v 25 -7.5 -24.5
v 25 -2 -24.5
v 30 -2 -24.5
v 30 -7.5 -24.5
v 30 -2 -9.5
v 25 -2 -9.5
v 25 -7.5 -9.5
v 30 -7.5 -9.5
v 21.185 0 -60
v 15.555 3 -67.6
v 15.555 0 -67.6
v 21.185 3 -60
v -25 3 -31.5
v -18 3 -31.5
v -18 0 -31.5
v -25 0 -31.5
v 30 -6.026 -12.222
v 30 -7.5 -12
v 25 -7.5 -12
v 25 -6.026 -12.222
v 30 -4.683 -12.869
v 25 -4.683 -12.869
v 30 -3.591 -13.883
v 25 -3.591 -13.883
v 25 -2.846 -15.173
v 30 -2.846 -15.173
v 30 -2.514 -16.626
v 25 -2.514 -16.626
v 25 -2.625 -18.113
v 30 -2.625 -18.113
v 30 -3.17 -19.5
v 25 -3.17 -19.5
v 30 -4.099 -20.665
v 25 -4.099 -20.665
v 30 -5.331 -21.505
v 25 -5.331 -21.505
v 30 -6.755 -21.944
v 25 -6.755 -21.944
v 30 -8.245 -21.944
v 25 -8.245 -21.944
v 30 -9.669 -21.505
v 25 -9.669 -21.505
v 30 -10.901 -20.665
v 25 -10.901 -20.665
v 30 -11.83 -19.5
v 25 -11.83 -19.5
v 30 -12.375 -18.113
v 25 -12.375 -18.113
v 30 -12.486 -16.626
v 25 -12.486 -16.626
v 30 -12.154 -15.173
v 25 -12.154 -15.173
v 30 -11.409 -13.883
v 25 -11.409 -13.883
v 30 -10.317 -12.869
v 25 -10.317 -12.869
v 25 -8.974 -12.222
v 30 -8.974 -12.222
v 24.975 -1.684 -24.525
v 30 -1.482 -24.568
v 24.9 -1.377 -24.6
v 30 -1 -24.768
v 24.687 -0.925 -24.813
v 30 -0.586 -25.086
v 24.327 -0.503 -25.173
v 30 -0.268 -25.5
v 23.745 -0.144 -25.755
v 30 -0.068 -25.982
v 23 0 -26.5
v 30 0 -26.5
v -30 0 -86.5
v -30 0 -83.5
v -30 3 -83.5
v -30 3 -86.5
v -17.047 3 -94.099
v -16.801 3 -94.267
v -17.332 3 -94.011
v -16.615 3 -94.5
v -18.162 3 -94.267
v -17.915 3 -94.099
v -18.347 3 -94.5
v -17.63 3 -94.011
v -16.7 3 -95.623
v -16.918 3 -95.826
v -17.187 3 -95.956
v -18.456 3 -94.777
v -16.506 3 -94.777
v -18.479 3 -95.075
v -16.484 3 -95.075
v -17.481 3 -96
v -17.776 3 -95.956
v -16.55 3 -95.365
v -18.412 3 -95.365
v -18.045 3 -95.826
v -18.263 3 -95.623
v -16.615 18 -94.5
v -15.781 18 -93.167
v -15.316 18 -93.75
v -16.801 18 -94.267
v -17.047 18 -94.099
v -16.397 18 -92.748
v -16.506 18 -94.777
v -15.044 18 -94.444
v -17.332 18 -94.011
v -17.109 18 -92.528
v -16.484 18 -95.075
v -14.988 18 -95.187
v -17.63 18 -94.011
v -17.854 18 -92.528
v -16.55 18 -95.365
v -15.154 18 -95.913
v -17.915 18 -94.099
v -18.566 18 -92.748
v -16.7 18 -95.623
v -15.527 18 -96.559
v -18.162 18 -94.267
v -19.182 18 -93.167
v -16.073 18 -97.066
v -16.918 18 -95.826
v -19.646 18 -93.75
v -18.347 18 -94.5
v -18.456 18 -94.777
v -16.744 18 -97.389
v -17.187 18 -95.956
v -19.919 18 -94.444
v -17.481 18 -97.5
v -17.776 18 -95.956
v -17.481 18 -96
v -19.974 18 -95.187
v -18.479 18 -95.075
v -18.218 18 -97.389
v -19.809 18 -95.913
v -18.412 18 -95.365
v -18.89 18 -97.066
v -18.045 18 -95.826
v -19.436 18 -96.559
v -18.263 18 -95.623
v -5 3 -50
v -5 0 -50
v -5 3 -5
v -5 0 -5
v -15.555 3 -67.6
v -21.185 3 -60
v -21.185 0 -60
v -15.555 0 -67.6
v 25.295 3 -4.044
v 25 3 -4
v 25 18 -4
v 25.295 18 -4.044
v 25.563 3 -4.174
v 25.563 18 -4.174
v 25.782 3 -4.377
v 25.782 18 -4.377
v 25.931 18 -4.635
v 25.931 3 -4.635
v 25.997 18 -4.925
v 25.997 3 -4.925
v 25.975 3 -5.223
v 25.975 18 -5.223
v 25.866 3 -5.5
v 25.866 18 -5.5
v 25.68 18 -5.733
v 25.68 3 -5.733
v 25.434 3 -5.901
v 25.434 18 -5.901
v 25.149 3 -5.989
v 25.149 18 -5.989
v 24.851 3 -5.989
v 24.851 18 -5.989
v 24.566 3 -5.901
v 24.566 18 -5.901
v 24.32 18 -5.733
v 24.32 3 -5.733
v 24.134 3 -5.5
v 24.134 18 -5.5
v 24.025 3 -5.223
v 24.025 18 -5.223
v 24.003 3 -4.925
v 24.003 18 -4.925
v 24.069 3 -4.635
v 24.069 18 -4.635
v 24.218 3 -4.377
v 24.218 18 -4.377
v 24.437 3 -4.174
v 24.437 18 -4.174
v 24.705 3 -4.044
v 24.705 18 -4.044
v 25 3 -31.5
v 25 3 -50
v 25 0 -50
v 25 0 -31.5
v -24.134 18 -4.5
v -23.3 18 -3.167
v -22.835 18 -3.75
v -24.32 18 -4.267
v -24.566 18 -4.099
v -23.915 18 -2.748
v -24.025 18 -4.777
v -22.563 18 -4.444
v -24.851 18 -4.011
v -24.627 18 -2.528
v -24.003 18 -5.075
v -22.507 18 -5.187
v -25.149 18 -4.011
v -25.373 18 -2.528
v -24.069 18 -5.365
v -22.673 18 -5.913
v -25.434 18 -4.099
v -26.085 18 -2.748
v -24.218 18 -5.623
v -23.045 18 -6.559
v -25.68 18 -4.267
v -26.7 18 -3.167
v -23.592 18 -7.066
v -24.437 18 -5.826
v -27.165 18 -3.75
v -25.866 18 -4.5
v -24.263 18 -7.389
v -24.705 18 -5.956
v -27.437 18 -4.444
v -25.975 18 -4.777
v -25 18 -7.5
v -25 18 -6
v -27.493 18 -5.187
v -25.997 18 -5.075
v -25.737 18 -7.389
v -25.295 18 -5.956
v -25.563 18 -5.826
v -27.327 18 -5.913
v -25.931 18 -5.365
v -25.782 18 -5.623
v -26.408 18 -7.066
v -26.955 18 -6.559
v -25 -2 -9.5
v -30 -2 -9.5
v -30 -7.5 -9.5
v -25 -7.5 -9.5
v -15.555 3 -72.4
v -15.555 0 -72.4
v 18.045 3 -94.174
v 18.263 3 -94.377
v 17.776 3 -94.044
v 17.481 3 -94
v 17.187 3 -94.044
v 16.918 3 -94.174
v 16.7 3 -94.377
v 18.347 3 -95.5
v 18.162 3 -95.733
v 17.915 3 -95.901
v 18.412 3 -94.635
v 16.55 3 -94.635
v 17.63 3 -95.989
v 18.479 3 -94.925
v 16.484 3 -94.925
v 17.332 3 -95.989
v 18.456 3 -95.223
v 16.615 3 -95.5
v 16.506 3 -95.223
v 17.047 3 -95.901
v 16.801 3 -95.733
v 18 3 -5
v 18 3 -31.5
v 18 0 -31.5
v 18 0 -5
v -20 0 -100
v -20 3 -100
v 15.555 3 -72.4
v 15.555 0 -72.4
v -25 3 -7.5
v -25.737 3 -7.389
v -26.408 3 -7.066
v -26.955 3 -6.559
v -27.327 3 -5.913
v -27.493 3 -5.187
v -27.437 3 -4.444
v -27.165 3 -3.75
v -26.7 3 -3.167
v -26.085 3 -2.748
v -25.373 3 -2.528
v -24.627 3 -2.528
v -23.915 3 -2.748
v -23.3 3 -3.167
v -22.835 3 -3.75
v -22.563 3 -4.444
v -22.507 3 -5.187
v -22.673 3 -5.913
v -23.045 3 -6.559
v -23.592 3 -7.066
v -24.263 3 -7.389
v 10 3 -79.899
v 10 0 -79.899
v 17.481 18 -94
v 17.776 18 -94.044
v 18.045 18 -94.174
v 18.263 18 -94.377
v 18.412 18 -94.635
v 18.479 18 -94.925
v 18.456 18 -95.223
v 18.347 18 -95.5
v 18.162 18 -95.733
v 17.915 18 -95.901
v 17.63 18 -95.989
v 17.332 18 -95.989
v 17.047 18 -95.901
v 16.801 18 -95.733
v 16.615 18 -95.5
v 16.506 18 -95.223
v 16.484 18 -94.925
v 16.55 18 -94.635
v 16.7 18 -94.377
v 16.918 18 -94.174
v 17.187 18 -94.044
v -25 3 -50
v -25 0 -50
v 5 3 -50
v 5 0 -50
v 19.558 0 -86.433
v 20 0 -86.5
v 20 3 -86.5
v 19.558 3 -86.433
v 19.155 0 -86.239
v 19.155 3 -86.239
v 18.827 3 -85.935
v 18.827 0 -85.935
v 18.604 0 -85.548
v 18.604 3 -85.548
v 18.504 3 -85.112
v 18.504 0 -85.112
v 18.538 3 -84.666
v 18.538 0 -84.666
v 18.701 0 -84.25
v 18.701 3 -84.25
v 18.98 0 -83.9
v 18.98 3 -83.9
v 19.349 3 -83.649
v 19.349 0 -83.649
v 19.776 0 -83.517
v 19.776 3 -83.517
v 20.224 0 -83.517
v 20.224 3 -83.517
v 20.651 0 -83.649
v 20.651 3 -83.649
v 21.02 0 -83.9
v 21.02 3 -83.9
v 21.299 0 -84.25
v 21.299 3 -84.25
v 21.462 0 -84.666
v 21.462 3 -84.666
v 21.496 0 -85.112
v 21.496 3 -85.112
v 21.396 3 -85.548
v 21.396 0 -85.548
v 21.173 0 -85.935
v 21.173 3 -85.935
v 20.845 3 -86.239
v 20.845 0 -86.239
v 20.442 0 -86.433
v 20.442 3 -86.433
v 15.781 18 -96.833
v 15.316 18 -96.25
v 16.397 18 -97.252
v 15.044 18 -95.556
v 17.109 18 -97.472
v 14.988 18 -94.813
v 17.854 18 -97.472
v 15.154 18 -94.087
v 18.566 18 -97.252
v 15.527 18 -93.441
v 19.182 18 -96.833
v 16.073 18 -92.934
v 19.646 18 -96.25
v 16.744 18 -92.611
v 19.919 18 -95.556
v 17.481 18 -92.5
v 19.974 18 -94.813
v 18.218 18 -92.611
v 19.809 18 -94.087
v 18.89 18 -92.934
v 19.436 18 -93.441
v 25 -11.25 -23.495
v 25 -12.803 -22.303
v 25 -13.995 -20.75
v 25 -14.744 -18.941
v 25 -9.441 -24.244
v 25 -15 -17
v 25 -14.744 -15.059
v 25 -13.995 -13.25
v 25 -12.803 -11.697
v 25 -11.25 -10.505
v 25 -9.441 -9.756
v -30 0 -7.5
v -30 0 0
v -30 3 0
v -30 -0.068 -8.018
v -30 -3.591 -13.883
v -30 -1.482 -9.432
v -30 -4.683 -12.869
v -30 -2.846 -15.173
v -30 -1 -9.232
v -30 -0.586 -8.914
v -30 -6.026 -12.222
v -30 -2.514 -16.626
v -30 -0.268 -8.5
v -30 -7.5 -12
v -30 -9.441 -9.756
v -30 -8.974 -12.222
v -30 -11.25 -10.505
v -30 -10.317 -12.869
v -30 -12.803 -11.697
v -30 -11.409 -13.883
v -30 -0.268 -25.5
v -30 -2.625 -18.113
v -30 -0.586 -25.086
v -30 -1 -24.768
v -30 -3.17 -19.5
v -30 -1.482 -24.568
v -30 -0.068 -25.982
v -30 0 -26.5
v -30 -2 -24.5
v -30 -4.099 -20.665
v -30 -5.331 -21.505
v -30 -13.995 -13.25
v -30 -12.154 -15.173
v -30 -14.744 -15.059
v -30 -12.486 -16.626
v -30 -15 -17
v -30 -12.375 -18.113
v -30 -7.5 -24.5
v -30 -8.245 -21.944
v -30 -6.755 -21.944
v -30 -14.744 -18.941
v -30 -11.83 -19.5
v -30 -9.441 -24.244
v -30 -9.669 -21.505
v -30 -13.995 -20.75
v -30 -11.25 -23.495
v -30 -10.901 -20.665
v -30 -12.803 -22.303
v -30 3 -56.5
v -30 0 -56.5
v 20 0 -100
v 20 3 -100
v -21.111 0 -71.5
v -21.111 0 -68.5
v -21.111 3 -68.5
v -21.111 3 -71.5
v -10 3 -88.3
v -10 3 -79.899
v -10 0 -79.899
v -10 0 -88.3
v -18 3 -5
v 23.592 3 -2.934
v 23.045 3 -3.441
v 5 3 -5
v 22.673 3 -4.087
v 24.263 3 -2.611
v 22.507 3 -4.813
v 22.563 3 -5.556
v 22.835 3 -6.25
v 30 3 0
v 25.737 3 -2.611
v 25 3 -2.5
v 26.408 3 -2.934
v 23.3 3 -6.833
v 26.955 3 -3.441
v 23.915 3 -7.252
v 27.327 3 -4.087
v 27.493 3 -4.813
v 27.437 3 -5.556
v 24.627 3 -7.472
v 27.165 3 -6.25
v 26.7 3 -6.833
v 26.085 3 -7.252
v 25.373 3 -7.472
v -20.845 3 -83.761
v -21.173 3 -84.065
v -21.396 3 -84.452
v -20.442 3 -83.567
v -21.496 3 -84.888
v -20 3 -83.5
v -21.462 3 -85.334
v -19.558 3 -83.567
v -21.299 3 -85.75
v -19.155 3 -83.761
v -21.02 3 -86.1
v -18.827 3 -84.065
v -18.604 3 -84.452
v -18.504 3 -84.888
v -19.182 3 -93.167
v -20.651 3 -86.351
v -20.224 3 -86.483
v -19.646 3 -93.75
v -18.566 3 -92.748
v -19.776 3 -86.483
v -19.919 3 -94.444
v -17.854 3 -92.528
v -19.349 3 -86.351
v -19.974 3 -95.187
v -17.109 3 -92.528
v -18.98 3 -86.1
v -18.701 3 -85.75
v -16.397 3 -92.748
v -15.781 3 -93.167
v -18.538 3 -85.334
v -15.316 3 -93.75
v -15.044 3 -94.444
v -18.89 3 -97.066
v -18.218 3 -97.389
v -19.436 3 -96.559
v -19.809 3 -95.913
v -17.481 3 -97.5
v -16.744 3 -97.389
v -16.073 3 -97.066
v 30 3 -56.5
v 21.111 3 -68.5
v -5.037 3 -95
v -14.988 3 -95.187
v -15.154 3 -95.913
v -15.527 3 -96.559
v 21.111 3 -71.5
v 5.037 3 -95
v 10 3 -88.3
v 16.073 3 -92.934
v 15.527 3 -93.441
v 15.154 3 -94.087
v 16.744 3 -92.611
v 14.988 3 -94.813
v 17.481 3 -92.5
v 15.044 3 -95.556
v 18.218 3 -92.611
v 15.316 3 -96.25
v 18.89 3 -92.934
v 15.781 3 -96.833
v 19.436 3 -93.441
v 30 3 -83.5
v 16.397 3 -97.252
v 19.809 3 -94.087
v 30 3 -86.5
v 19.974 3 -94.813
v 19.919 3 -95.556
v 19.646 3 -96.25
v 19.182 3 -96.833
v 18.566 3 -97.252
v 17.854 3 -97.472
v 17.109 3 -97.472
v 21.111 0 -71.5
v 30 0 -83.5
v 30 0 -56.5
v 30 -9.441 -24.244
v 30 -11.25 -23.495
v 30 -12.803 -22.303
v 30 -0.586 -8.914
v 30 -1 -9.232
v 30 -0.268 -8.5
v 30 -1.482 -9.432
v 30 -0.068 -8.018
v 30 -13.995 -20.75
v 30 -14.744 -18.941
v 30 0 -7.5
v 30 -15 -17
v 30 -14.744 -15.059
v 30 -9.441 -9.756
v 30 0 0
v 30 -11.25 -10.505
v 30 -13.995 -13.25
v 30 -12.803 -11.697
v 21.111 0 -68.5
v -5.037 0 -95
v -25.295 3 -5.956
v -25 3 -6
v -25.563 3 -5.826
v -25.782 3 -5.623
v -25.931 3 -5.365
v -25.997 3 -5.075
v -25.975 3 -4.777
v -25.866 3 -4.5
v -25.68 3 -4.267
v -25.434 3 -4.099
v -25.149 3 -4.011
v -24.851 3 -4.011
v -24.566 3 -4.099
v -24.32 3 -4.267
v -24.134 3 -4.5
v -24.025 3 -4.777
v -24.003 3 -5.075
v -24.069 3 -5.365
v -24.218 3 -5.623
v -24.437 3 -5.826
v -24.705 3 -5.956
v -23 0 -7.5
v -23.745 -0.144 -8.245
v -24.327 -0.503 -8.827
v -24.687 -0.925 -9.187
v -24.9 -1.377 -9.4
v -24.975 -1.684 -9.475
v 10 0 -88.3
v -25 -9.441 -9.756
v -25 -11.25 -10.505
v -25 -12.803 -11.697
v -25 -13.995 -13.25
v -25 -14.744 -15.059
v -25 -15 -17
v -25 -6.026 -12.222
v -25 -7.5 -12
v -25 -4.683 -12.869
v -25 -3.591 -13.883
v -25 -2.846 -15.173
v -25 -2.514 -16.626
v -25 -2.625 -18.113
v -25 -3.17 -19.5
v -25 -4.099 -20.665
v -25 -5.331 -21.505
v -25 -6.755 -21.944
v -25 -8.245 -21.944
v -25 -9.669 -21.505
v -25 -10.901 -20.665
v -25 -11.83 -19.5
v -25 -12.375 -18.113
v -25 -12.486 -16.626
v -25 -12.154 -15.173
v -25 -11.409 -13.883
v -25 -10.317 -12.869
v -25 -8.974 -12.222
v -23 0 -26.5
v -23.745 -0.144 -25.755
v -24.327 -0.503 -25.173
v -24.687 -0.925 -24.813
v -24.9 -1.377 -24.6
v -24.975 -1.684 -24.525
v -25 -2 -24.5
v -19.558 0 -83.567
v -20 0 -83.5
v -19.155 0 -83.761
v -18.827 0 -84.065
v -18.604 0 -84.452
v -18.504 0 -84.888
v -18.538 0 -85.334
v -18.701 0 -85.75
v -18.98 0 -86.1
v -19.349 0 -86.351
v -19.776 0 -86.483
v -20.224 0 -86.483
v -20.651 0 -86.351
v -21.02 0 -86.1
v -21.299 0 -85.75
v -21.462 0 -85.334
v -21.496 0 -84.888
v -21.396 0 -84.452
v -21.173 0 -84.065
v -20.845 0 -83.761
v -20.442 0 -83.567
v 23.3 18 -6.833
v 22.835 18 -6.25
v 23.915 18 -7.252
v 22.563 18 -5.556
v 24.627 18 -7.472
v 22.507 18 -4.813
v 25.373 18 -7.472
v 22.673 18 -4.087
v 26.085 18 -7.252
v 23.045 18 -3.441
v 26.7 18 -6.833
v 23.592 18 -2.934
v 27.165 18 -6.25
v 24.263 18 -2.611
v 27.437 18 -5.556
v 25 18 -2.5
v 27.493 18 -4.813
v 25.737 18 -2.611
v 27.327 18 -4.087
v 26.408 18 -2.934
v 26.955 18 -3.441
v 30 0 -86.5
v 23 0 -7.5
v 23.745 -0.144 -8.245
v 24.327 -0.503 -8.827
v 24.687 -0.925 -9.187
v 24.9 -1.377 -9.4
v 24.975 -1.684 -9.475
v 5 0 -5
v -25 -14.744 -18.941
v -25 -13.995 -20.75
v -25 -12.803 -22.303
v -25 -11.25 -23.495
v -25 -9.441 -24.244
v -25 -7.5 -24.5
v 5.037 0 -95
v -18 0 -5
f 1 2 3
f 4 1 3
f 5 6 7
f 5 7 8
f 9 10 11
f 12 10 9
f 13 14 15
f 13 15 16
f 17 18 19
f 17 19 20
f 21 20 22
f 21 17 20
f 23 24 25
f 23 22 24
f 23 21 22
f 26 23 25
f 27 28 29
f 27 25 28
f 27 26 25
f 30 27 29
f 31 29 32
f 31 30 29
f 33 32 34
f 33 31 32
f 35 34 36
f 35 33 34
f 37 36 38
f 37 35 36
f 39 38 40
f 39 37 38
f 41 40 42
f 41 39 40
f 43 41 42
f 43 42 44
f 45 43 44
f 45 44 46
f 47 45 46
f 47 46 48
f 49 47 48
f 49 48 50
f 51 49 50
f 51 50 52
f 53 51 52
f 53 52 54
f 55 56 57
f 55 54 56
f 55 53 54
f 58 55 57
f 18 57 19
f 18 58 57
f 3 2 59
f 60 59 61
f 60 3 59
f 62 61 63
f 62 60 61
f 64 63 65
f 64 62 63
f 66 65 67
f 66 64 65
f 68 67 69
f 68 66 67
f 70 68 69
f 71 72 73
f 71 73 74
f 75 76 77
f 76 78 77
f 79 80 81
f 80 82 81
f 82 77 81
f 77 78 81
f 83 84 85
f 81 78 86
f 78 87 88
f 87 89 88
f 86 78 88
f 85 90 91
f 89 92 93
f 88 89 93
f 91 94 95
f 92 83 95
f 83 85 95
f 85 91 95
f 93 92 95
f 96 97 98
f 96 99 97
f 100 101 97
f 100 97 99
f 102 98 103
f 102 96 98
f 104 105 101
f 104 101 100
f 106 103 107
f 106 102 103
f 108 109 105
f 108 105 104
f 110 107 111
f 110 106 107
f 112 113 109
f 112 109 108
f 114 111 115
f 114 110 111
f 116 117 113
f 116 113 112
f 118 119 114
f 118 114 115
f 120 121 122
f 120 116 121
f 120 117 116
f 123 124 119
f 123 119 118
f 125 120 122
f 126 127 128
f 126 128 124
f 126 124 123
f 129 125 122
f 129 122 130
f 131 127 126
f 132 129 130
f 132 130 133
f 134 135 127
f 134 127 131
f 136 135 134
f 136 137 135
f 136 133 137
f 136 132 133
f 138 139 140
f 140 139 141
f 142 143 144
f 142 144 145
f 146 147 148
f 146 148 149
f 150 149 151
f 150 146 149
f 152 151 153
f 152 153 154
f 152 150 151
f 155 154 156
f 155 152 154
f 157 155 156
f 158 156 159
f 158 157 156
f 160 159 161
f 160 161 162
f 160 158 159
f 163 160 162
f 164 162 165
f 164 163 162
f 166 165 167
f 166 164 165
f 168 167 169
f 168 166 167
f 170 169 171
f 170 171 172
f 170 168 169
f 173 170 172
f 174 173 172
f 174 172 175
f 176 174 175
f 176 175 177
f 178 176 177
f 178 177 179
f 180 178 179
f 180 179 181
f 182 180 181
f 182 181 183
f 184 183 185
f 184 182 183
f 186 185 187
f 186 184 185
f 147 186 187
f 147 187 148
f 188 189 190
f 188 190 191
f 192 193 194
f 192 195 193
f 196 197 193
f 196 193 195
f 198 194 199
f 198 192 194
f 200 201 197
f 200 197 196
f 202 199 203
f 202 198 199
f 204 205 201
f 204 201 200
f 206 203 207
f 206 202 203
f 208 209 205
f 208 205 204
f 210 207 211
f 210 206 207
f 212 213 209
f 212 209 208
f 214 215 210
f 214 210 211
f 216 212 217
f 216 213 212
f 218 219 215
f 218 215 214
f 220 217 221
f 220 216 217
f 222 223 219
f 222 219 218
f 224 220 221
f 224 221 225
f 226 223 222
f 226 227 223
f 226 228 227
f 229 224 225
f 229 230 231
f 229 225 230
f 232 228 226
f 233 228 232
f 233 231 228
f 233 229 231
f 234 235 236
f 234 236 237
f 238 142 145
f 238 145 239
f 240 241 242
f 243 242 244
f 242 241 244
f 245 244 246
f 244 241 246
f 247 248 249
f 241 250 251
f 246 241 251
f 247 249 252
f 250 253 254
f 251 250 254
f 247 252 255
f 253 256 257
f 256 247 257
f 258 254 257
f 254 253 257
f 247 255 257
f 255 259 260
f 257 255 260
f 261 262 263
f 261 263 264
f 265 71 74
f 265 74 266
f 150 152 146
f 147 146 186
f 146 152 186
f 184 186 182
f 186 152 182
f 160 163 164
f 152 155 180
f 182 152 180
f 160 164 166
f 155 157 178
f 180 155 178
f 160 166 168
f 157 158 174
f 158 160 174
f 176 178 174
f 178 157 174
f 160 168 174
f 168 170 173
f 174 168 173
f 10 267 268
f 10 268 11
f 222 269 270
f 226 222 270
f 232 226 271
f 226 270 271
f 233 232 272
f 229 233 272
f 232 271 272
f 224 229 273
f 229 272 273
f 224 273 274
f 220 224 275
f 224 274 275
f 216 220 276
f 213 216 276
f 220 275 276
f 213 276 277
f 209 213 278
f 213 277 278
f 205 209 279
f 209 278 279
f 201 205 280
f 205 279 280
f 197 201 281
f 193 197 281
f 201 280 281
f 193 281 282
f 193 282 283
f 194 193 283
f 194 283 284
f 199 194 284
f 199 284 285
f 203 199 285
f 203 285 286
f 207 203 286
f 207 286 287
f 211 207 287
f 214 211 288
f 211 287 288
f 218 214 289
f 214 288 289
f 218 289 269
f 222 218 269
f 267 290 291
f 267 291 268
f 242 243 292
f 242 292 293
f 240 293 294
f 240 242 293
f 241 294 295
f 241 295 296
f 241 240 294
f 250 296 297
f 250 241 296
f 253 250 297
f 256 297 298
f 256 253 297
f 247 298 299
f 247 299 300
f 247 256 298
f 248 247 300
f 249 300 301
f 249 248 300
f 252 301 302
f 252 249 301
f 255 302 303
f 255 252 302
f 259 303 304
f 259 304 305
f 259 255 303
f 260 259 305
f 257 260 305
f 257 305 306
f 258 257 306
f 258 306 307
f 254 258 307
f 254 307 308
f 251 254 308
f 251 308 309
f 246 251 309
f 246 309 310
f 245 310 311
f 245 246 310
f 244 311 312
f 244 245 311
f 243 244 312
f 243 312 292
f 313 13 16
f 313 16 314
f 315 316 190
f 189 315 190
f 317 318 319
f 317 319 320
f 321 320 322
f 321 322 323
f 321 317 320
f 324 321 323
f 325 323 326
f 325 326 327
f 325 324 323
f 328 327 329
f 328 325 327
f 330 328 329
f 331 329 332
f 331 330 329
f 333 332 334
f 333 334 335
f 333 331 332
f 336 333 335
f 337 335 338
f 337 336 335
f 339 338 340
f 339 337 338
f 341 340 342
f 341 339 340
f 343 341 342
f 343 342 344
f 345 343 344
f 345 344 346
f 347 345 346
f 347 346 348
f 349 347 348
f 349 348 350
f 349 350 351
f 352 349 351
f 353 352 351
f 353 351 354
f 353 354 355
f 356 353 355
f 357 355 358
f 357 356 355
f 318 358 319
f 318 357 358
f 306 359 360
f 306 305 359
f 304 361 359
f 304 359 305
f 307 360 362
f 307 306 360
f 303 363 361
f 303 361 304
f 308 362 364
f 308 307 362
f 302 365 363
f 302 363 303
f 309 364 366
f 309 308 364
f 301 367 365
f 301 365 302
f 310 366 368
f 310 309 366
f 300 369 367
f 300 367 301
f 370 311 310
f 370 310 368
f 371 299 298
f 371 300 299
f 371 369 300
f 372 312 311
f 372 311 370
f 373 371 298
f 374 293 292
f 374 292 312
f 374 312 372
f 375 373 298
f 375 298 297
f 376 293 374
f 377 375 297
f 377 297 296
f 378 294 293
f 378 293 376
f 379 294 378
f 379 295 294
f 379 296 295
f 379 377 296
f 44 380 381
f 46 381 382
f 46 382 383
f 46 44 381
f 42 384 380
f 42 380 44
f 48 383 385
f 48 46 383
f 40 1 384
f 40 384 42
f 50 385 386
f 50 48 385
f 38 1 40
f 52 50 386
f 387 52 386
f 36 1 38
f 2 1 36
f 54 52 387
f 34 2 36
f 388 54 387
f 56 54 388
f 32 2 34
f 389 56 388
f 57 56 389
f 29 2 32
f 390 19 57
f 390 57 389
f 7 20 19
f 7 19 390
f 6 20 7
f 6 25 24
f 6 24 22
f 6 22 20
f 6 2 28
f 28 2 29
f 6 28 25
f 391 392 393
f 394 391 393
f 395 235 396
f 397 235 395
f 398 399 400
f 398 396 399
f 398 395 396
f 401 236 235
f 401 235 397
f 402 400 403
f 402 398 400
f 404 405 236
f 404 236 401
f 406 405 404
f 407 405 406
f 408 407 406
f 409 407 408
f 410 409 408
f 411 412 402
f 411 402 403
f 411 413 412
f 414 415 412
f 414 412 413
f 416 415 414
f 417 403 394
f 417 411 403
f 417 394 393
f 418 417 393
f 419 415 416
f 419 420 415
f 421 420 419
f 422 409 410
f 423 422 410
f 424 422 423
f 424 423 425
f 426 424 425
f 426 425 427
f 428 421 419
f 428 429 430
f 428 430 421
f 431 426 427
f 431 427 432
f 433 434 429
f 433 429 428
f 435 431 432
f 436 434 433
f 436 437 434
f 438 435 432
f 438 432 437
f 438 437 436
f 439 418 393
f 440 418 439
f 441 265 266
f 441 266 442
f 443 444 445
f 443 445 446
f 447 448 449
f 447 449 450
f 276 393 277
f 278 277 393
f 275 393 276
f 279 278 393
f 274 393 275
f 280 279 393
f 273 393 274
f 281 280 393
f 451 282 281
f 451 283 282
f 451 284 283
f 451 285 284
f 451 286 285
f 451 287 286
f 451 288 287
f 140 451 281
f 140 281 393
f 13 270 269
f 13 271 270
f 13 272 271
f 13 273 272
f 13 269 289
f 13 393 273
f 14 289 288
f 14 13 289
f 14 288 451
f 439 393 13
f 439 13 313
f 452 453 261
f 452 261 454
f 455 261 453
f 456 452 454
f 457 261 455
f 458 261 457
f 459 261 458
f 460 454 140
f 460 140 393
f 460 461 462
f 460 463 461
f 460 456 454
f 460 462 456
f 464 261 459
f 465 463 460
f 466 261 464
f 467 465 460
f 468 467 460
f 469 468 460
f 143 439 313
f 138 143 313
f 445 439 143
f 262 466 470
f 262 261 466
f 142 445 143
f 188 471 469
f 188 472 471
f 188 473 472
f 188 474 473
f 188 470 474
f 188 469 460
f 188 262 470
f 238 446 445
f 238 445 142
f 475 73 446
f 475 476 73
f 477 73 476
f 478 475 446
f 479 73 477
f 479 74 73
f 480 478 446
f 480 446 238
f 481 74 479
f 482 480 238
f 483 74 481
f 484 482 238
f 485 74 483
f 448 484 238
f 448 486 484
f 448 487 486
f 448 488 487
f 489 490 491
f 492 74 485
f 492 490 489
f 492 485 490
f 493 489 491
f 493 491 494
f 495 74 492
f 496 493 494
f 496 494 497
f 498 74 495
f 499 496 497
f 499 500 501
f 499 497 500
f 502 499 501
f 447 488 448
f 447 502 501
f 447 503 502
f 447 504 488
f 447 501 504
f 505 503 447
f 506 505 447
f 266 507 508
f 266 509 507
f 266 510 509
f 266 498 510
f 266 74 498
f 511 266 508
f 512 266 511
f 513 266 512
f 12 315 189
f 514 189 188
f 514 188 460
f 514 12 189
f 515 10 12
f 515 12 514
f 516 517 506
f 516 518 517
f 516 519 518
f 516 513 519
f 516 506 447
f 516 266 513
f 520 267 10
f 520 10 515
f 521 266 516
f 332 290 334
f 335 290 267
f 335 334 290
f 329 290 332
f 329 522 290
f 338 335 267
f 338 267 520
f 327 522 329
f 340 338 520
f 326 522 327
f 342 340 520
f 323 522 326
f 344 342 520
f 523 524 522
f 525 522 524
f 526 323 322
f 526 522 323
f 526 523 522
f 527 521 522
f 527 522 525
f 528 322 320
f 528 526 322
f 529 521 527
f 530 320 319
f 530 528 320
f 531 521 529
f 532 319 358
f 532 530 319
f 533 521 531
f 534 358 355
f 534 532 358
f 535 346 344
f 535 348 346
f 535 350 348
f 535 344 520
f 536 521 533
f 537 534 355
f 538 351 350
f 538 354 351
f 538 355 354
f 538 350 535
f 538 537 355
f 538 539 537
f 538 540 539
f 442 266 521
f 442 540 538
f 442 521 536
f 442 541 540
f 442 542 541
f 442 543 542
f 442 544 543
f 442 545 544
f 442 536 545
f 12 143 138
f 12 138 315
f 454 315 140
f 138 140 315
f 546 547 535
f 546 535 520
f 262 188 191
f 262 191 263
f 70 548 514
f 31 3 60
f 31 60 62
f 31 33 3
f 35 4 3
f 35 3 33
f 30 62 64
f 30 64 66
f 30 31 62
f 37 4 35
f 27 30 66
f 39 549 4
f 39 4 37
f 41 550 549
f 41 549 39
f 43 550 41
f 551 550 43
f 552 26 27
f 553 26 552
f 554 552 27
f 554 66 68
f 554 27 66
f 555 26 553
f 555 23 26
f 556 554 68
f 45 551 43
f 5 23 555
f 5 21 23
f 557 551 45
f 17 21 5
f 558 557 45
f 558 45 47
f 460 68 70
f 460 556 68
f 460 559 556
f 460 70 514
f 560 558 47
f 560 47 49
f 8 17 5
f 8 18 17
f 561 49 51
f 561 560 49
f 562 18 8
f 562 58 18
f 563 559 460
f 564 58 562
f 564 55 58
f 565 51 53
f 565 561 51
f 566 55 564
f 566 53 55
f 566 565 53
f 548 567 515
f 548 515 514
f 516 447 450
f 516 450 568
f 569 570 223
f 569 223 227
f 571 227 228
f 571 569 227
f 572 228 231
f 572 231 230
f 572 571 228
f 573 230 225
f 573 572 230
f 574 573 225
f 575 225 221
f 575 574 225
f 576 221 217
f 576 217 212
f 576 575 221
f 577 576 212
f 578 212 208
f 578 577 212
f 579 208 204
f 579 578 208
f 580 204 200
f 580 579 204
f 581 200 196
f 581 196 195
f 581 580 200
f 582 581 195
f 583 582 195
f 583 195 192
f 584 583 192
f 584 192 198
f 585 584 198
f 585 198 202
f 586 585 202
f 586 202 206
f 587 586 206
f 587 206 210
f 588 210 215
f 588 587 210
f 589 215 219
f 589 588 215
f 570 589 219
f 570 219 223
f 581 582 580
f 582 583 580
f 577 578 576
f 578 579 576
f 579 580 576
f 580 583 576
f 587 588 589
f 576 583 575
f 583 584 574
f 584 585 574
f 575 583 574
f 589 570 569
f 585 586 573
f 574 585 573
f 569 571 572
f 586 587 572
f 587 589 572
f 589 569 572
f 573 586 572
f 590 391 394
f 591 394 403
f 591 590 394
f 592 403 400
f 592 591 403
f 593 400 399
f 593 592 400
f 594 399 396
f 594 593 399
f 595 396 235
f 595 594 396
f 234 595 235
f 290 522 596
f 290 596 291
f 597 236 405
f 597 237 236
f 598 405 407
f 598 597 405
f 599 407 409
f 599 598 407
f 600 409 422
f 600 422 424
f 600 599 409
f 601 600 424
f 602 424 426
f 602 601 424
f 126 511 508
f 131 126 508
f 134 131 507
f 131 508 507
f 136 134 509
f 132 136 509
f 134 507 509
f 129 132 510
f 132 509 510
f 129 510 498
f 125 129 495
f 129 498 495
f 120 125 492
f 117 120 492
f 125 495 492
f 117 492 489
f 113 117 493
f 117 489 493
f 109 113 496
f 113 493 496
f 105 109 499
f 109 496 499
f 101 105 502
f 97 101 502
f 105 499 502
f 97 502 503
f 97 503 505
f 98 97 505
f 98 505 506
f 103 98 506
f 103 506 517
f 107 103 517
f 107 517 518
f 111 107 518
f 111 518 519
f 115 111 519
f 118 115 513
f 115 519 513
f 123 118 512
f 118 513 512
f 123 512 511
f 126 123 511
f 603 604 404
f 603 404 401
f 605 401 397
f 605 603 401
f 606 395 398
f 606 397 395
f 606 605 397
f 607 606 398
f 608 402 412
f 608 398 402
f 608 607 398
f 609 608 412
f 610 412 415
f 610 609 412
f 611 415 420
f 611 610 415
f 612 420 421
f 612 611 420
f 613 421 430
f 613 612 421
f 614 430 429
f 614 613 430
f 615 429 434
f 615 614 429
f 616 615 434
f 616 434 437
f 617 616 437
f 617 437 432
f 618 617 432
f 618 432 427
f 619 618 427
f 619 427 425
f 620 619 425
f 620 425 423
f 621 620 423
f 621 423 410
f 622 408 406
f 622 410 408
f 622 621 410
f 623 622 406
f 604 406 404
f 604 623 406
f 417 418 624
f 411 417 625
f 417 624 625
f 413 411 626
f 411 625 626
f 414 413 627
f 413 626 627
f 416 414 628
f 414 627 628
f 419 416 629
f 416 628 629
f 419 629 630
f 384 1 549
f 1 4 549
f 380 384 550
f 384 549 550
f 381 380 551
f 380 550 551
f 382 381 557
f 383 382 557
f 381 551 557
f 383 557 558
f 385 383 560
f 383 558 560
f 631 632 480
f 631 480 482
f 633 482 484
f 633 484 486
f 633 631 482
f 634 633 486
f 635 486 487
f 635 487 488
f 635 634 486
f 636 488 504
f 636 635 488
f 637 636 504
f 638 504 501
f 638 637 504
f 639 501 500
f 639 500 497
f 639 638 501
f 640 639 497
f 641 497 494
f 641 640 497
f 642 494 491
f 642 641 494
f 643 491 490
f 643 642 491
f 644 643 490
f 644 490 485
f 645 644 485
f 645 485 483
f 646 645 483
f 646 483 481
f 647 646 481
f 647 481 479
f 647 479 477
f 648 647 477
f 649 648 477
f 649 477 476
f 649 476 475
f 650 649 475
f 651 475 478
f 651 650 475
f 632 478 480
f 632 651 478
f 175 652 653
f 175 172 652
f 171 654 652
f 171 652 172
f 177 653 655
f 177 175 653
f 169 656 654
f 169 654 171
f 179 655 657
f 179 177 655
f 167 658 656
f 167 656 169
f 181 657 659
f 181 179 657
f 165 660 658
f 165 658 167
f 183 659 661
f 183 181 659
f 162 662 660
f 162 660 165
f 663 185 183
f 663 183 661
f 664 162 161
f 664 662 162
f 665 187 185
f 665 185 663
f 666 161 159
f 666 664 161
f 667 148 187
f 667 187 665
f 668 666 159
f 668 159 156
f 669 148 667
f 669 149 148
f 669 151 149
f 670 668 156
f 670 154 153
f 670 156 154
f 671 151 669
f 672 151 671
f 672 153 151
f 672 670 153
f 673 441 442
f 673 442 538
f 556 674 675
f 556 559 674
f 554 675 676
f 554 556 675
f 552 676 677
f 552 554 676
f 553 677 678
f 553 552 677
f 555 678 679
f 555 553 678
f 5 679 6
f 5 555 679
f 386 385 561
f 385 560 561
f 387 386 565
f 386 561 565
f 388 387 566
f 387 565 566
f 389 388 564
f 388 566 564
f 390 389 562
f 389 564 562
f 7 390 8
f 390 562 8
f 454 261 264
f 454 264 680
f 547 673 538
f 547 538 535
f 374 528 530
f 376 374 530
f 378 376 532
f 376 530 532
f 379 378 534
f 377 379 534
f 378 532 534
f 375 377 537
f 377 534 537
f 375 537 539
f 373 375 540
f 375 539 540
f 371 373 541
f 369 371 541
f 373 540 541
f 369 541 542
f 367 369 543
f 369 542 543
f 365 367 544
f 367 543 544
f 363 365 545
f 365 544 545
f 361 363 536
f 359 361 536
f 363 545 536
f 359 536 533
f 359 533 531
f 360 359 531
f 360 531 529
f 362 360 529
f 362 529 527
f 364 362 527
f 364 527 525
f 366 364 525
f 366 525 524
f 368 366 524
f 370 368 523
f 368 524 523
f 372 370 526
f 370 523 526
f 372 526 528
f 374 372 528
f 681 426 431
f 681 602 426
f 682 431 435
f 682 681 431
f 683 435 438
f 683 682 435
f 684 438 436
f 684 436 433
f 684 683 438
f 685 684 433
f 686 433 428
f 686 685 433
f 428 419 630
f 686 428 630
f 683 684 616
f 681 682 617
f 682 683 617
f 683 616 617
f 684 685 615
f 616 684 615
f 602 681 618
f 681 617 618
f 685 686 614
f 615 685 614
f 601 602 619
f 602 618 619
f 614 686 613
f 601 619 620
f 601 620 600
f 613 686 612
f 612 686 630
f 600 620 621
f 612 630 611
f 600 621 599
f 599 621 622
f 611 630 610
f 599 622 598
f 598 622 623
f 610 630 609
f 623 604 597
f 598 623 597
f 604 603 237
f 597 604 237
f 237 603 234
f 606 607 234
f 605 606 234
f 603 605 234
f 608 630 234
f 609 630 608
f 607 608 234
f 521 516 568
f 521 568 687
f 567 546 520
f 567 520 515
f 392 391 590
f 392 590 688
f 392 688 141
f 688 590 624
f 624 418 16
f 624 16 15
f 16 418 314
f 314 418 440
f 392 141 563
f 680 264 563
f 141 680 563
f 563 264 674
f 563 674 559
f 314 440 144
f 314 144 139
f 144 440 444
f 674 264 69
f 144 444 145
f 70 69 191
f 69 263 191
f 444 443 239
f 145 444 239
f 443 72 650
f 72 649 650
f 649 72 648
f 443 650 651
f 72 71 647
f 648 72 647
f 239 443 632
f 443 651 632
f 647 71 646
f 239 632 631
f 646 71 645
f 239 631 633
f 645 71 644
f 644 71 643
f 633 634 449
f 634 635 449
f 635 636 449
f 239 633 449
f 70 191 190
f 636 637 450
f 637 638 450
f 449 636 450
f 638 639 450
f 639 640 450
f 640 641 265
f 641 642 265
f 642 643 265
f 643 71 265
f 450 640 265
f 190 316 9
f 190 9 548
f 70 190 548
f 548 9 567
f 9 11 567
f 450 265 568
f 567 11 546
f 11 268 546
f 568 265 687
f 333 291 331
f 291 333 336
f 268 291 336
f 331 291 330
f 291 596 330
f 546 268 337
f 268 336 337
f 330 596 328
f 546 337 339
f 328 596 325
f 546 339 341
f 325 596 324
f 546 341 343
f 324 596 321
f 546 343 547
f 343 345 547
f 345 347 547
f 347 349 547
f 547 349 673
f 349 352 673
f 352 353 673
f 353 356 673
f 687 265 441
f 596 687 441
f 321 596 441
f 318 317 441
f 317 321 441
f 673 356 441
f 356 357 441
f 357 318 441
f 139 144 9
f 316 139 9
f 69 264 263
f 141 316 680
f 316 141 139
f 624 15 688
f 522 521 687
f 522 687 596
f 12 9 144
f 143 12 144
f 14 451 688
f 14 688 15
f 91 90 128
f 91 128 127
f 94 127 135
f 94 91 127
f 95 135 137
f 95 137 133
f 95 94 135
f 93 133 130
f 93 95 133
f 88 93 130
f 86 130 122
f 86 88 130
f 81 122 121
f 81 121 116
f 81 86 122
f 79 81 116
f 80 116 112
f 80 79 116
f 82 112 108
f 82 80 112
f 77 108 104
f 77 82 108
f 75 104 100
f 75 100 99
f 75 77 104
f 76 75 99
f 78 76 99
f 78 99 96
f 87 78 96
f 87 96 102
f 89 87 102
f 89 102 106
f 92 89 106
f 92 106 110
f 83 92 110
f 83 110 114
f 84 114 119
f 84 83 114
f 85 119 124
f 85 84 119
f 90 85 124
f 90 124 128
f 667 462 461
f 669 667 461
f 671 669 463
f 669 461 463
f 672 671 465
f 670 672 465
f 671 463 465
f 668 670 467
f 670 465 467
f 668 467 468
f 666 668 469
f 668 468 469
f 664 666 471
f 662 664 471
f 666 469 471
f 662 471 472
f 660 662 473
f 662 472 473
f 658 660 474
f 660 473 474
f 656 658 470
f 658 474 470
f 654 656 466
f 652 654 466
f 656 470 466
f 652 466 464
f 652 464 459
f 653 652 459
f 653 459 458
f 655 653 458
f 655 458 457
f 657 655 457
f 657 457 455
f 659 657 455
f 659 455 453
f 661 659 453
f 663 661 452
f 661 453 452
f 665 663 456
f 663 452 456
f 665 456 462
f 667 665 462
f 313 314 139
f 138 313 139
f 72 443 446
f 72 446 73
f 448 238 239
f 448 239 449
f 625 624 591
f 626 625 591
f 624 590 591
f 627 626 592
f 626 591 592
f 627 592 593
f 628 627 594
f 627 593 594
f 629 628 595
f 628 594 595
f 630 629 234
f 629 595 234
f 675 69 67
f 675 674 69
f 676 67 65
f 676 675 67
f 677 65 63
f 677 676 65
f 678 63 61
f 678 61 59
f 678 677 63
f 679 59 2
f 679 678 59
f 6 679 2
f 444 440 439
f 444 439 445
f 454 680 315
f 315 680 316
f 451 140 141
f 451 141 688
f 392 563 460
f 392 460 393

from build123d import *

# Parameters (mm, degrees)
SKETCH2_R               = 1.5
BOSS_EXTRUDE1_DEPTH     = 3
SKETCH5_W               = 5
SKETCH5_H               = 15
BOSS_EXTRUDE3_DEPTH     = 15
CUT_EXTRUDE1_DEPTH      = 118.579760163
CUT_EXTRUDE1_DEPTH_BACK = 118.579760163
SKETCH6_R               = 5
FILLET1_R               = 7.5
FILLET2_R               = 2
SKETCH7_R               = 2.5
SKETCH7_R_2             = 1
BOSS_EXTRUDE4_DEPTH     = 15
CUT_EXTRUDE2_DEPTH      = 106.943381105
CUT_EXTRUDE2_DEPTH_BACK = 106.943381105
BOSS_EXTRUDE5_DEPTH     = 3


with BuildPart() as part:
    # Sketch2 → Boss-Extrude1 (new body)
    with BuildSketch(Plane(origin=(0, 0, 0), x_dir=(1, 0, 0), z_dir=(0, 1, 0))):
        Polygon((30, 0), (-30, 0), (-30, 56.5), (-21.111111111, 68.5), (-21.111111111, 71.5), (-30, 83.5), (-30, 86.5), (-20, 100), (20, 100), (30, 86.5), (30, 83.5), (21.111111111, 71.5), (21.111111111, 68.5), (30, 56.5), align=None)
        with Locations(Location((-20, 85, 0), (0, 0, 270))):
            Circle(SKETCH2_R, mode=Mode.SUBTRACT)
        with Locations(Location((20, 85, 0), (0, 0, 90))):
            Circle(SKETCH2_R, mode=Mode.SUBTRACT)
    extrude(amount=BOSS_EXTRUDE1_DEPTH)

    # Sketch5 → Boss-Extrude3 (add)
    with BuildSketch(Plane.XZ):
        with Locations((-27.5, -17)):
            Rectangle(SKETCH5_W, SKETCH5_H)
        with Locations((27.5, -17)):
            Rectangle(SKETCH5_W, SKETCH5_H)
    extrude(amount=BOSS_EXTRUDE3_DEPTH)

    # Sketch6 → Cut-Extrude1 (cut, two sides: drawn at the far end of the back side and taken through both)
    with BuildSketch(Plane.ZY.offset(30).offset(-CUT_EXTRUDE1_DEPTH_BACK)):
        with Locations((-17, -7.5)):
            Circle(SKETCH6_R)
    extrude(amount=CUT_EXTRUDE1_DEPTH + CUT_EXTRUDE1_DEPTH_BACK, mode=Mode.SUBTRACT)

    # Fillet1
    fillet1_edges = [part.edges().sort_by_distance(p)[0] for p in [
        (27.5, -15, -9.5),
        (27.5, -15, -24.5),
        (-27.5, -15, -24.5),
        (-27.5, -15, -9.5),
    ]]
    fillet(fillet1_edges, radius=FILLET1_R - 0.0001)  # a hair under: the kernel refuses the full size

    # Fillet2
    fillet2_edges = [part.edges().sort_by_distance(p)[0] for p in [
        (-27.5, 0, -24.5),
        (-25, 0, -17),
        (-27.5, 0, -9.5),
        (25, 0, -17),
        (27.5, 0, -24.5),
        (27.5, 0, -9.5),
    ]]
    fillet(fillet2_edges, radius=FILLET2_R)

    # Sketch7 → Boss-Extrude4 (add)
    # profile 1 of 4: a face of its own
    with BuildSketch(Plane(origin=(0, 3, 0), x_dir=(1, 0, 0), z_dir=(0, 1, 0))):
        with Locations(Location((25, 5, 0), (0, 0, 270))):
            Circle(SKETCH7_R)
        with Locations(Location((25, 5, 0), (0, 0, 270))):
            Circle(SKETCH7_R_2, mode=Mode.SUBTRACT)
    # profile 2 of 4: a face of its own
    with BuildSketch(Plane(origin=(0, 3, 0), x_dir=(1, 0, 0), z_dir=(0, 1, 0))):
        with Locations(Location((-25, 5, 0), (0, 0, 90))):
            Circle(SKETCH7_R)
        with Locations(Location((-25, 5, 0), (0, 0, 90))):
            Circle(SKETCH7_R_2, mode=Mode.SUBTRACT)
    # profile 3 of 4: a face of its own
    with BuildSketch(Plane(origin=(0, 3, 0), x_dir=(1, 0, 0), z_dir=(0, 1, 0))):
        with Locations(Location((17.481371253, 95, 0), (0, 0, 270))):
            Circle(SKETCH7_R)
        with Locations(Location((17.481371253, 95, 0), (0, 0, 270))):
            Circle(SKETCH7_R_2, mode=Mode.SUBTRACT)
    # profile 4 of 4: a face of its own
    with BuildSketch(Plane(origin=(0, 3, 0), x_dir=(1, 0, 0), z_dir=(0, 1, 0))):
        with Locations(Location((-17.481371253, 95, 0), (0, 0, 90))):
            Circle(SKETCH7_R)
        with Locations(Location((-17.481371253, 95, 0), (0, 0, 90))):
            Circle(SKETCH7_R_2, mode=Mode.SUBTRACT)
    extrude(amount=BOSS_EXTRUDE4_DEPTH)

    # Sketch8 → Cut-Extrude2 (cut, two sides: drawn at the far end of the back side and taken through both)
    with BuildSketch(Plane.XZ.offset(-CUT_EXTRUDE2_DEPTH_BACK)):
        Polygon((-18, -5), (-18, -31.5), (-25, -31.5), (-25, -54.849851192), (-15.555279985, -67.600223212), (-15.555279985, -72.399776788), (-10, -79.899404767), (-10, -88.299553575), (-5.036706352, -95), (5.036706352, -95), (10, -88.299553575), (10, -79.899404767), (15.555279985, -72.399776788), (15.555279985, -67.600223212), (25, -54.849851192), (25, -31.5), (18, -31.5), (18, -5), align=None)
    extrude(amount=CUT_EXTRUDE2_DEPTH + CUT_EXTRUDE2_DEPTH_BACK, mode=Mode.SUBTRACT)

    # Sketch9 → Boss-Extrude5 (add)
    with BuildSketch(Plane(origin=(0, 0, 0), x_dir=(1, 0, 0), z_dir=(0, 1, 0))):
        Polygon((-25, 50), (-5, 50), (-5, 0), (5, 0), (5, 50), (25, 50), (25, 54.849851192), (21.185074957, 60), (-21.185074957, 60), (-25, 54.849851192), align=None)
    extrude(amount=BOSS_EXTRUDE5_DEPTH)


solid = part.part
